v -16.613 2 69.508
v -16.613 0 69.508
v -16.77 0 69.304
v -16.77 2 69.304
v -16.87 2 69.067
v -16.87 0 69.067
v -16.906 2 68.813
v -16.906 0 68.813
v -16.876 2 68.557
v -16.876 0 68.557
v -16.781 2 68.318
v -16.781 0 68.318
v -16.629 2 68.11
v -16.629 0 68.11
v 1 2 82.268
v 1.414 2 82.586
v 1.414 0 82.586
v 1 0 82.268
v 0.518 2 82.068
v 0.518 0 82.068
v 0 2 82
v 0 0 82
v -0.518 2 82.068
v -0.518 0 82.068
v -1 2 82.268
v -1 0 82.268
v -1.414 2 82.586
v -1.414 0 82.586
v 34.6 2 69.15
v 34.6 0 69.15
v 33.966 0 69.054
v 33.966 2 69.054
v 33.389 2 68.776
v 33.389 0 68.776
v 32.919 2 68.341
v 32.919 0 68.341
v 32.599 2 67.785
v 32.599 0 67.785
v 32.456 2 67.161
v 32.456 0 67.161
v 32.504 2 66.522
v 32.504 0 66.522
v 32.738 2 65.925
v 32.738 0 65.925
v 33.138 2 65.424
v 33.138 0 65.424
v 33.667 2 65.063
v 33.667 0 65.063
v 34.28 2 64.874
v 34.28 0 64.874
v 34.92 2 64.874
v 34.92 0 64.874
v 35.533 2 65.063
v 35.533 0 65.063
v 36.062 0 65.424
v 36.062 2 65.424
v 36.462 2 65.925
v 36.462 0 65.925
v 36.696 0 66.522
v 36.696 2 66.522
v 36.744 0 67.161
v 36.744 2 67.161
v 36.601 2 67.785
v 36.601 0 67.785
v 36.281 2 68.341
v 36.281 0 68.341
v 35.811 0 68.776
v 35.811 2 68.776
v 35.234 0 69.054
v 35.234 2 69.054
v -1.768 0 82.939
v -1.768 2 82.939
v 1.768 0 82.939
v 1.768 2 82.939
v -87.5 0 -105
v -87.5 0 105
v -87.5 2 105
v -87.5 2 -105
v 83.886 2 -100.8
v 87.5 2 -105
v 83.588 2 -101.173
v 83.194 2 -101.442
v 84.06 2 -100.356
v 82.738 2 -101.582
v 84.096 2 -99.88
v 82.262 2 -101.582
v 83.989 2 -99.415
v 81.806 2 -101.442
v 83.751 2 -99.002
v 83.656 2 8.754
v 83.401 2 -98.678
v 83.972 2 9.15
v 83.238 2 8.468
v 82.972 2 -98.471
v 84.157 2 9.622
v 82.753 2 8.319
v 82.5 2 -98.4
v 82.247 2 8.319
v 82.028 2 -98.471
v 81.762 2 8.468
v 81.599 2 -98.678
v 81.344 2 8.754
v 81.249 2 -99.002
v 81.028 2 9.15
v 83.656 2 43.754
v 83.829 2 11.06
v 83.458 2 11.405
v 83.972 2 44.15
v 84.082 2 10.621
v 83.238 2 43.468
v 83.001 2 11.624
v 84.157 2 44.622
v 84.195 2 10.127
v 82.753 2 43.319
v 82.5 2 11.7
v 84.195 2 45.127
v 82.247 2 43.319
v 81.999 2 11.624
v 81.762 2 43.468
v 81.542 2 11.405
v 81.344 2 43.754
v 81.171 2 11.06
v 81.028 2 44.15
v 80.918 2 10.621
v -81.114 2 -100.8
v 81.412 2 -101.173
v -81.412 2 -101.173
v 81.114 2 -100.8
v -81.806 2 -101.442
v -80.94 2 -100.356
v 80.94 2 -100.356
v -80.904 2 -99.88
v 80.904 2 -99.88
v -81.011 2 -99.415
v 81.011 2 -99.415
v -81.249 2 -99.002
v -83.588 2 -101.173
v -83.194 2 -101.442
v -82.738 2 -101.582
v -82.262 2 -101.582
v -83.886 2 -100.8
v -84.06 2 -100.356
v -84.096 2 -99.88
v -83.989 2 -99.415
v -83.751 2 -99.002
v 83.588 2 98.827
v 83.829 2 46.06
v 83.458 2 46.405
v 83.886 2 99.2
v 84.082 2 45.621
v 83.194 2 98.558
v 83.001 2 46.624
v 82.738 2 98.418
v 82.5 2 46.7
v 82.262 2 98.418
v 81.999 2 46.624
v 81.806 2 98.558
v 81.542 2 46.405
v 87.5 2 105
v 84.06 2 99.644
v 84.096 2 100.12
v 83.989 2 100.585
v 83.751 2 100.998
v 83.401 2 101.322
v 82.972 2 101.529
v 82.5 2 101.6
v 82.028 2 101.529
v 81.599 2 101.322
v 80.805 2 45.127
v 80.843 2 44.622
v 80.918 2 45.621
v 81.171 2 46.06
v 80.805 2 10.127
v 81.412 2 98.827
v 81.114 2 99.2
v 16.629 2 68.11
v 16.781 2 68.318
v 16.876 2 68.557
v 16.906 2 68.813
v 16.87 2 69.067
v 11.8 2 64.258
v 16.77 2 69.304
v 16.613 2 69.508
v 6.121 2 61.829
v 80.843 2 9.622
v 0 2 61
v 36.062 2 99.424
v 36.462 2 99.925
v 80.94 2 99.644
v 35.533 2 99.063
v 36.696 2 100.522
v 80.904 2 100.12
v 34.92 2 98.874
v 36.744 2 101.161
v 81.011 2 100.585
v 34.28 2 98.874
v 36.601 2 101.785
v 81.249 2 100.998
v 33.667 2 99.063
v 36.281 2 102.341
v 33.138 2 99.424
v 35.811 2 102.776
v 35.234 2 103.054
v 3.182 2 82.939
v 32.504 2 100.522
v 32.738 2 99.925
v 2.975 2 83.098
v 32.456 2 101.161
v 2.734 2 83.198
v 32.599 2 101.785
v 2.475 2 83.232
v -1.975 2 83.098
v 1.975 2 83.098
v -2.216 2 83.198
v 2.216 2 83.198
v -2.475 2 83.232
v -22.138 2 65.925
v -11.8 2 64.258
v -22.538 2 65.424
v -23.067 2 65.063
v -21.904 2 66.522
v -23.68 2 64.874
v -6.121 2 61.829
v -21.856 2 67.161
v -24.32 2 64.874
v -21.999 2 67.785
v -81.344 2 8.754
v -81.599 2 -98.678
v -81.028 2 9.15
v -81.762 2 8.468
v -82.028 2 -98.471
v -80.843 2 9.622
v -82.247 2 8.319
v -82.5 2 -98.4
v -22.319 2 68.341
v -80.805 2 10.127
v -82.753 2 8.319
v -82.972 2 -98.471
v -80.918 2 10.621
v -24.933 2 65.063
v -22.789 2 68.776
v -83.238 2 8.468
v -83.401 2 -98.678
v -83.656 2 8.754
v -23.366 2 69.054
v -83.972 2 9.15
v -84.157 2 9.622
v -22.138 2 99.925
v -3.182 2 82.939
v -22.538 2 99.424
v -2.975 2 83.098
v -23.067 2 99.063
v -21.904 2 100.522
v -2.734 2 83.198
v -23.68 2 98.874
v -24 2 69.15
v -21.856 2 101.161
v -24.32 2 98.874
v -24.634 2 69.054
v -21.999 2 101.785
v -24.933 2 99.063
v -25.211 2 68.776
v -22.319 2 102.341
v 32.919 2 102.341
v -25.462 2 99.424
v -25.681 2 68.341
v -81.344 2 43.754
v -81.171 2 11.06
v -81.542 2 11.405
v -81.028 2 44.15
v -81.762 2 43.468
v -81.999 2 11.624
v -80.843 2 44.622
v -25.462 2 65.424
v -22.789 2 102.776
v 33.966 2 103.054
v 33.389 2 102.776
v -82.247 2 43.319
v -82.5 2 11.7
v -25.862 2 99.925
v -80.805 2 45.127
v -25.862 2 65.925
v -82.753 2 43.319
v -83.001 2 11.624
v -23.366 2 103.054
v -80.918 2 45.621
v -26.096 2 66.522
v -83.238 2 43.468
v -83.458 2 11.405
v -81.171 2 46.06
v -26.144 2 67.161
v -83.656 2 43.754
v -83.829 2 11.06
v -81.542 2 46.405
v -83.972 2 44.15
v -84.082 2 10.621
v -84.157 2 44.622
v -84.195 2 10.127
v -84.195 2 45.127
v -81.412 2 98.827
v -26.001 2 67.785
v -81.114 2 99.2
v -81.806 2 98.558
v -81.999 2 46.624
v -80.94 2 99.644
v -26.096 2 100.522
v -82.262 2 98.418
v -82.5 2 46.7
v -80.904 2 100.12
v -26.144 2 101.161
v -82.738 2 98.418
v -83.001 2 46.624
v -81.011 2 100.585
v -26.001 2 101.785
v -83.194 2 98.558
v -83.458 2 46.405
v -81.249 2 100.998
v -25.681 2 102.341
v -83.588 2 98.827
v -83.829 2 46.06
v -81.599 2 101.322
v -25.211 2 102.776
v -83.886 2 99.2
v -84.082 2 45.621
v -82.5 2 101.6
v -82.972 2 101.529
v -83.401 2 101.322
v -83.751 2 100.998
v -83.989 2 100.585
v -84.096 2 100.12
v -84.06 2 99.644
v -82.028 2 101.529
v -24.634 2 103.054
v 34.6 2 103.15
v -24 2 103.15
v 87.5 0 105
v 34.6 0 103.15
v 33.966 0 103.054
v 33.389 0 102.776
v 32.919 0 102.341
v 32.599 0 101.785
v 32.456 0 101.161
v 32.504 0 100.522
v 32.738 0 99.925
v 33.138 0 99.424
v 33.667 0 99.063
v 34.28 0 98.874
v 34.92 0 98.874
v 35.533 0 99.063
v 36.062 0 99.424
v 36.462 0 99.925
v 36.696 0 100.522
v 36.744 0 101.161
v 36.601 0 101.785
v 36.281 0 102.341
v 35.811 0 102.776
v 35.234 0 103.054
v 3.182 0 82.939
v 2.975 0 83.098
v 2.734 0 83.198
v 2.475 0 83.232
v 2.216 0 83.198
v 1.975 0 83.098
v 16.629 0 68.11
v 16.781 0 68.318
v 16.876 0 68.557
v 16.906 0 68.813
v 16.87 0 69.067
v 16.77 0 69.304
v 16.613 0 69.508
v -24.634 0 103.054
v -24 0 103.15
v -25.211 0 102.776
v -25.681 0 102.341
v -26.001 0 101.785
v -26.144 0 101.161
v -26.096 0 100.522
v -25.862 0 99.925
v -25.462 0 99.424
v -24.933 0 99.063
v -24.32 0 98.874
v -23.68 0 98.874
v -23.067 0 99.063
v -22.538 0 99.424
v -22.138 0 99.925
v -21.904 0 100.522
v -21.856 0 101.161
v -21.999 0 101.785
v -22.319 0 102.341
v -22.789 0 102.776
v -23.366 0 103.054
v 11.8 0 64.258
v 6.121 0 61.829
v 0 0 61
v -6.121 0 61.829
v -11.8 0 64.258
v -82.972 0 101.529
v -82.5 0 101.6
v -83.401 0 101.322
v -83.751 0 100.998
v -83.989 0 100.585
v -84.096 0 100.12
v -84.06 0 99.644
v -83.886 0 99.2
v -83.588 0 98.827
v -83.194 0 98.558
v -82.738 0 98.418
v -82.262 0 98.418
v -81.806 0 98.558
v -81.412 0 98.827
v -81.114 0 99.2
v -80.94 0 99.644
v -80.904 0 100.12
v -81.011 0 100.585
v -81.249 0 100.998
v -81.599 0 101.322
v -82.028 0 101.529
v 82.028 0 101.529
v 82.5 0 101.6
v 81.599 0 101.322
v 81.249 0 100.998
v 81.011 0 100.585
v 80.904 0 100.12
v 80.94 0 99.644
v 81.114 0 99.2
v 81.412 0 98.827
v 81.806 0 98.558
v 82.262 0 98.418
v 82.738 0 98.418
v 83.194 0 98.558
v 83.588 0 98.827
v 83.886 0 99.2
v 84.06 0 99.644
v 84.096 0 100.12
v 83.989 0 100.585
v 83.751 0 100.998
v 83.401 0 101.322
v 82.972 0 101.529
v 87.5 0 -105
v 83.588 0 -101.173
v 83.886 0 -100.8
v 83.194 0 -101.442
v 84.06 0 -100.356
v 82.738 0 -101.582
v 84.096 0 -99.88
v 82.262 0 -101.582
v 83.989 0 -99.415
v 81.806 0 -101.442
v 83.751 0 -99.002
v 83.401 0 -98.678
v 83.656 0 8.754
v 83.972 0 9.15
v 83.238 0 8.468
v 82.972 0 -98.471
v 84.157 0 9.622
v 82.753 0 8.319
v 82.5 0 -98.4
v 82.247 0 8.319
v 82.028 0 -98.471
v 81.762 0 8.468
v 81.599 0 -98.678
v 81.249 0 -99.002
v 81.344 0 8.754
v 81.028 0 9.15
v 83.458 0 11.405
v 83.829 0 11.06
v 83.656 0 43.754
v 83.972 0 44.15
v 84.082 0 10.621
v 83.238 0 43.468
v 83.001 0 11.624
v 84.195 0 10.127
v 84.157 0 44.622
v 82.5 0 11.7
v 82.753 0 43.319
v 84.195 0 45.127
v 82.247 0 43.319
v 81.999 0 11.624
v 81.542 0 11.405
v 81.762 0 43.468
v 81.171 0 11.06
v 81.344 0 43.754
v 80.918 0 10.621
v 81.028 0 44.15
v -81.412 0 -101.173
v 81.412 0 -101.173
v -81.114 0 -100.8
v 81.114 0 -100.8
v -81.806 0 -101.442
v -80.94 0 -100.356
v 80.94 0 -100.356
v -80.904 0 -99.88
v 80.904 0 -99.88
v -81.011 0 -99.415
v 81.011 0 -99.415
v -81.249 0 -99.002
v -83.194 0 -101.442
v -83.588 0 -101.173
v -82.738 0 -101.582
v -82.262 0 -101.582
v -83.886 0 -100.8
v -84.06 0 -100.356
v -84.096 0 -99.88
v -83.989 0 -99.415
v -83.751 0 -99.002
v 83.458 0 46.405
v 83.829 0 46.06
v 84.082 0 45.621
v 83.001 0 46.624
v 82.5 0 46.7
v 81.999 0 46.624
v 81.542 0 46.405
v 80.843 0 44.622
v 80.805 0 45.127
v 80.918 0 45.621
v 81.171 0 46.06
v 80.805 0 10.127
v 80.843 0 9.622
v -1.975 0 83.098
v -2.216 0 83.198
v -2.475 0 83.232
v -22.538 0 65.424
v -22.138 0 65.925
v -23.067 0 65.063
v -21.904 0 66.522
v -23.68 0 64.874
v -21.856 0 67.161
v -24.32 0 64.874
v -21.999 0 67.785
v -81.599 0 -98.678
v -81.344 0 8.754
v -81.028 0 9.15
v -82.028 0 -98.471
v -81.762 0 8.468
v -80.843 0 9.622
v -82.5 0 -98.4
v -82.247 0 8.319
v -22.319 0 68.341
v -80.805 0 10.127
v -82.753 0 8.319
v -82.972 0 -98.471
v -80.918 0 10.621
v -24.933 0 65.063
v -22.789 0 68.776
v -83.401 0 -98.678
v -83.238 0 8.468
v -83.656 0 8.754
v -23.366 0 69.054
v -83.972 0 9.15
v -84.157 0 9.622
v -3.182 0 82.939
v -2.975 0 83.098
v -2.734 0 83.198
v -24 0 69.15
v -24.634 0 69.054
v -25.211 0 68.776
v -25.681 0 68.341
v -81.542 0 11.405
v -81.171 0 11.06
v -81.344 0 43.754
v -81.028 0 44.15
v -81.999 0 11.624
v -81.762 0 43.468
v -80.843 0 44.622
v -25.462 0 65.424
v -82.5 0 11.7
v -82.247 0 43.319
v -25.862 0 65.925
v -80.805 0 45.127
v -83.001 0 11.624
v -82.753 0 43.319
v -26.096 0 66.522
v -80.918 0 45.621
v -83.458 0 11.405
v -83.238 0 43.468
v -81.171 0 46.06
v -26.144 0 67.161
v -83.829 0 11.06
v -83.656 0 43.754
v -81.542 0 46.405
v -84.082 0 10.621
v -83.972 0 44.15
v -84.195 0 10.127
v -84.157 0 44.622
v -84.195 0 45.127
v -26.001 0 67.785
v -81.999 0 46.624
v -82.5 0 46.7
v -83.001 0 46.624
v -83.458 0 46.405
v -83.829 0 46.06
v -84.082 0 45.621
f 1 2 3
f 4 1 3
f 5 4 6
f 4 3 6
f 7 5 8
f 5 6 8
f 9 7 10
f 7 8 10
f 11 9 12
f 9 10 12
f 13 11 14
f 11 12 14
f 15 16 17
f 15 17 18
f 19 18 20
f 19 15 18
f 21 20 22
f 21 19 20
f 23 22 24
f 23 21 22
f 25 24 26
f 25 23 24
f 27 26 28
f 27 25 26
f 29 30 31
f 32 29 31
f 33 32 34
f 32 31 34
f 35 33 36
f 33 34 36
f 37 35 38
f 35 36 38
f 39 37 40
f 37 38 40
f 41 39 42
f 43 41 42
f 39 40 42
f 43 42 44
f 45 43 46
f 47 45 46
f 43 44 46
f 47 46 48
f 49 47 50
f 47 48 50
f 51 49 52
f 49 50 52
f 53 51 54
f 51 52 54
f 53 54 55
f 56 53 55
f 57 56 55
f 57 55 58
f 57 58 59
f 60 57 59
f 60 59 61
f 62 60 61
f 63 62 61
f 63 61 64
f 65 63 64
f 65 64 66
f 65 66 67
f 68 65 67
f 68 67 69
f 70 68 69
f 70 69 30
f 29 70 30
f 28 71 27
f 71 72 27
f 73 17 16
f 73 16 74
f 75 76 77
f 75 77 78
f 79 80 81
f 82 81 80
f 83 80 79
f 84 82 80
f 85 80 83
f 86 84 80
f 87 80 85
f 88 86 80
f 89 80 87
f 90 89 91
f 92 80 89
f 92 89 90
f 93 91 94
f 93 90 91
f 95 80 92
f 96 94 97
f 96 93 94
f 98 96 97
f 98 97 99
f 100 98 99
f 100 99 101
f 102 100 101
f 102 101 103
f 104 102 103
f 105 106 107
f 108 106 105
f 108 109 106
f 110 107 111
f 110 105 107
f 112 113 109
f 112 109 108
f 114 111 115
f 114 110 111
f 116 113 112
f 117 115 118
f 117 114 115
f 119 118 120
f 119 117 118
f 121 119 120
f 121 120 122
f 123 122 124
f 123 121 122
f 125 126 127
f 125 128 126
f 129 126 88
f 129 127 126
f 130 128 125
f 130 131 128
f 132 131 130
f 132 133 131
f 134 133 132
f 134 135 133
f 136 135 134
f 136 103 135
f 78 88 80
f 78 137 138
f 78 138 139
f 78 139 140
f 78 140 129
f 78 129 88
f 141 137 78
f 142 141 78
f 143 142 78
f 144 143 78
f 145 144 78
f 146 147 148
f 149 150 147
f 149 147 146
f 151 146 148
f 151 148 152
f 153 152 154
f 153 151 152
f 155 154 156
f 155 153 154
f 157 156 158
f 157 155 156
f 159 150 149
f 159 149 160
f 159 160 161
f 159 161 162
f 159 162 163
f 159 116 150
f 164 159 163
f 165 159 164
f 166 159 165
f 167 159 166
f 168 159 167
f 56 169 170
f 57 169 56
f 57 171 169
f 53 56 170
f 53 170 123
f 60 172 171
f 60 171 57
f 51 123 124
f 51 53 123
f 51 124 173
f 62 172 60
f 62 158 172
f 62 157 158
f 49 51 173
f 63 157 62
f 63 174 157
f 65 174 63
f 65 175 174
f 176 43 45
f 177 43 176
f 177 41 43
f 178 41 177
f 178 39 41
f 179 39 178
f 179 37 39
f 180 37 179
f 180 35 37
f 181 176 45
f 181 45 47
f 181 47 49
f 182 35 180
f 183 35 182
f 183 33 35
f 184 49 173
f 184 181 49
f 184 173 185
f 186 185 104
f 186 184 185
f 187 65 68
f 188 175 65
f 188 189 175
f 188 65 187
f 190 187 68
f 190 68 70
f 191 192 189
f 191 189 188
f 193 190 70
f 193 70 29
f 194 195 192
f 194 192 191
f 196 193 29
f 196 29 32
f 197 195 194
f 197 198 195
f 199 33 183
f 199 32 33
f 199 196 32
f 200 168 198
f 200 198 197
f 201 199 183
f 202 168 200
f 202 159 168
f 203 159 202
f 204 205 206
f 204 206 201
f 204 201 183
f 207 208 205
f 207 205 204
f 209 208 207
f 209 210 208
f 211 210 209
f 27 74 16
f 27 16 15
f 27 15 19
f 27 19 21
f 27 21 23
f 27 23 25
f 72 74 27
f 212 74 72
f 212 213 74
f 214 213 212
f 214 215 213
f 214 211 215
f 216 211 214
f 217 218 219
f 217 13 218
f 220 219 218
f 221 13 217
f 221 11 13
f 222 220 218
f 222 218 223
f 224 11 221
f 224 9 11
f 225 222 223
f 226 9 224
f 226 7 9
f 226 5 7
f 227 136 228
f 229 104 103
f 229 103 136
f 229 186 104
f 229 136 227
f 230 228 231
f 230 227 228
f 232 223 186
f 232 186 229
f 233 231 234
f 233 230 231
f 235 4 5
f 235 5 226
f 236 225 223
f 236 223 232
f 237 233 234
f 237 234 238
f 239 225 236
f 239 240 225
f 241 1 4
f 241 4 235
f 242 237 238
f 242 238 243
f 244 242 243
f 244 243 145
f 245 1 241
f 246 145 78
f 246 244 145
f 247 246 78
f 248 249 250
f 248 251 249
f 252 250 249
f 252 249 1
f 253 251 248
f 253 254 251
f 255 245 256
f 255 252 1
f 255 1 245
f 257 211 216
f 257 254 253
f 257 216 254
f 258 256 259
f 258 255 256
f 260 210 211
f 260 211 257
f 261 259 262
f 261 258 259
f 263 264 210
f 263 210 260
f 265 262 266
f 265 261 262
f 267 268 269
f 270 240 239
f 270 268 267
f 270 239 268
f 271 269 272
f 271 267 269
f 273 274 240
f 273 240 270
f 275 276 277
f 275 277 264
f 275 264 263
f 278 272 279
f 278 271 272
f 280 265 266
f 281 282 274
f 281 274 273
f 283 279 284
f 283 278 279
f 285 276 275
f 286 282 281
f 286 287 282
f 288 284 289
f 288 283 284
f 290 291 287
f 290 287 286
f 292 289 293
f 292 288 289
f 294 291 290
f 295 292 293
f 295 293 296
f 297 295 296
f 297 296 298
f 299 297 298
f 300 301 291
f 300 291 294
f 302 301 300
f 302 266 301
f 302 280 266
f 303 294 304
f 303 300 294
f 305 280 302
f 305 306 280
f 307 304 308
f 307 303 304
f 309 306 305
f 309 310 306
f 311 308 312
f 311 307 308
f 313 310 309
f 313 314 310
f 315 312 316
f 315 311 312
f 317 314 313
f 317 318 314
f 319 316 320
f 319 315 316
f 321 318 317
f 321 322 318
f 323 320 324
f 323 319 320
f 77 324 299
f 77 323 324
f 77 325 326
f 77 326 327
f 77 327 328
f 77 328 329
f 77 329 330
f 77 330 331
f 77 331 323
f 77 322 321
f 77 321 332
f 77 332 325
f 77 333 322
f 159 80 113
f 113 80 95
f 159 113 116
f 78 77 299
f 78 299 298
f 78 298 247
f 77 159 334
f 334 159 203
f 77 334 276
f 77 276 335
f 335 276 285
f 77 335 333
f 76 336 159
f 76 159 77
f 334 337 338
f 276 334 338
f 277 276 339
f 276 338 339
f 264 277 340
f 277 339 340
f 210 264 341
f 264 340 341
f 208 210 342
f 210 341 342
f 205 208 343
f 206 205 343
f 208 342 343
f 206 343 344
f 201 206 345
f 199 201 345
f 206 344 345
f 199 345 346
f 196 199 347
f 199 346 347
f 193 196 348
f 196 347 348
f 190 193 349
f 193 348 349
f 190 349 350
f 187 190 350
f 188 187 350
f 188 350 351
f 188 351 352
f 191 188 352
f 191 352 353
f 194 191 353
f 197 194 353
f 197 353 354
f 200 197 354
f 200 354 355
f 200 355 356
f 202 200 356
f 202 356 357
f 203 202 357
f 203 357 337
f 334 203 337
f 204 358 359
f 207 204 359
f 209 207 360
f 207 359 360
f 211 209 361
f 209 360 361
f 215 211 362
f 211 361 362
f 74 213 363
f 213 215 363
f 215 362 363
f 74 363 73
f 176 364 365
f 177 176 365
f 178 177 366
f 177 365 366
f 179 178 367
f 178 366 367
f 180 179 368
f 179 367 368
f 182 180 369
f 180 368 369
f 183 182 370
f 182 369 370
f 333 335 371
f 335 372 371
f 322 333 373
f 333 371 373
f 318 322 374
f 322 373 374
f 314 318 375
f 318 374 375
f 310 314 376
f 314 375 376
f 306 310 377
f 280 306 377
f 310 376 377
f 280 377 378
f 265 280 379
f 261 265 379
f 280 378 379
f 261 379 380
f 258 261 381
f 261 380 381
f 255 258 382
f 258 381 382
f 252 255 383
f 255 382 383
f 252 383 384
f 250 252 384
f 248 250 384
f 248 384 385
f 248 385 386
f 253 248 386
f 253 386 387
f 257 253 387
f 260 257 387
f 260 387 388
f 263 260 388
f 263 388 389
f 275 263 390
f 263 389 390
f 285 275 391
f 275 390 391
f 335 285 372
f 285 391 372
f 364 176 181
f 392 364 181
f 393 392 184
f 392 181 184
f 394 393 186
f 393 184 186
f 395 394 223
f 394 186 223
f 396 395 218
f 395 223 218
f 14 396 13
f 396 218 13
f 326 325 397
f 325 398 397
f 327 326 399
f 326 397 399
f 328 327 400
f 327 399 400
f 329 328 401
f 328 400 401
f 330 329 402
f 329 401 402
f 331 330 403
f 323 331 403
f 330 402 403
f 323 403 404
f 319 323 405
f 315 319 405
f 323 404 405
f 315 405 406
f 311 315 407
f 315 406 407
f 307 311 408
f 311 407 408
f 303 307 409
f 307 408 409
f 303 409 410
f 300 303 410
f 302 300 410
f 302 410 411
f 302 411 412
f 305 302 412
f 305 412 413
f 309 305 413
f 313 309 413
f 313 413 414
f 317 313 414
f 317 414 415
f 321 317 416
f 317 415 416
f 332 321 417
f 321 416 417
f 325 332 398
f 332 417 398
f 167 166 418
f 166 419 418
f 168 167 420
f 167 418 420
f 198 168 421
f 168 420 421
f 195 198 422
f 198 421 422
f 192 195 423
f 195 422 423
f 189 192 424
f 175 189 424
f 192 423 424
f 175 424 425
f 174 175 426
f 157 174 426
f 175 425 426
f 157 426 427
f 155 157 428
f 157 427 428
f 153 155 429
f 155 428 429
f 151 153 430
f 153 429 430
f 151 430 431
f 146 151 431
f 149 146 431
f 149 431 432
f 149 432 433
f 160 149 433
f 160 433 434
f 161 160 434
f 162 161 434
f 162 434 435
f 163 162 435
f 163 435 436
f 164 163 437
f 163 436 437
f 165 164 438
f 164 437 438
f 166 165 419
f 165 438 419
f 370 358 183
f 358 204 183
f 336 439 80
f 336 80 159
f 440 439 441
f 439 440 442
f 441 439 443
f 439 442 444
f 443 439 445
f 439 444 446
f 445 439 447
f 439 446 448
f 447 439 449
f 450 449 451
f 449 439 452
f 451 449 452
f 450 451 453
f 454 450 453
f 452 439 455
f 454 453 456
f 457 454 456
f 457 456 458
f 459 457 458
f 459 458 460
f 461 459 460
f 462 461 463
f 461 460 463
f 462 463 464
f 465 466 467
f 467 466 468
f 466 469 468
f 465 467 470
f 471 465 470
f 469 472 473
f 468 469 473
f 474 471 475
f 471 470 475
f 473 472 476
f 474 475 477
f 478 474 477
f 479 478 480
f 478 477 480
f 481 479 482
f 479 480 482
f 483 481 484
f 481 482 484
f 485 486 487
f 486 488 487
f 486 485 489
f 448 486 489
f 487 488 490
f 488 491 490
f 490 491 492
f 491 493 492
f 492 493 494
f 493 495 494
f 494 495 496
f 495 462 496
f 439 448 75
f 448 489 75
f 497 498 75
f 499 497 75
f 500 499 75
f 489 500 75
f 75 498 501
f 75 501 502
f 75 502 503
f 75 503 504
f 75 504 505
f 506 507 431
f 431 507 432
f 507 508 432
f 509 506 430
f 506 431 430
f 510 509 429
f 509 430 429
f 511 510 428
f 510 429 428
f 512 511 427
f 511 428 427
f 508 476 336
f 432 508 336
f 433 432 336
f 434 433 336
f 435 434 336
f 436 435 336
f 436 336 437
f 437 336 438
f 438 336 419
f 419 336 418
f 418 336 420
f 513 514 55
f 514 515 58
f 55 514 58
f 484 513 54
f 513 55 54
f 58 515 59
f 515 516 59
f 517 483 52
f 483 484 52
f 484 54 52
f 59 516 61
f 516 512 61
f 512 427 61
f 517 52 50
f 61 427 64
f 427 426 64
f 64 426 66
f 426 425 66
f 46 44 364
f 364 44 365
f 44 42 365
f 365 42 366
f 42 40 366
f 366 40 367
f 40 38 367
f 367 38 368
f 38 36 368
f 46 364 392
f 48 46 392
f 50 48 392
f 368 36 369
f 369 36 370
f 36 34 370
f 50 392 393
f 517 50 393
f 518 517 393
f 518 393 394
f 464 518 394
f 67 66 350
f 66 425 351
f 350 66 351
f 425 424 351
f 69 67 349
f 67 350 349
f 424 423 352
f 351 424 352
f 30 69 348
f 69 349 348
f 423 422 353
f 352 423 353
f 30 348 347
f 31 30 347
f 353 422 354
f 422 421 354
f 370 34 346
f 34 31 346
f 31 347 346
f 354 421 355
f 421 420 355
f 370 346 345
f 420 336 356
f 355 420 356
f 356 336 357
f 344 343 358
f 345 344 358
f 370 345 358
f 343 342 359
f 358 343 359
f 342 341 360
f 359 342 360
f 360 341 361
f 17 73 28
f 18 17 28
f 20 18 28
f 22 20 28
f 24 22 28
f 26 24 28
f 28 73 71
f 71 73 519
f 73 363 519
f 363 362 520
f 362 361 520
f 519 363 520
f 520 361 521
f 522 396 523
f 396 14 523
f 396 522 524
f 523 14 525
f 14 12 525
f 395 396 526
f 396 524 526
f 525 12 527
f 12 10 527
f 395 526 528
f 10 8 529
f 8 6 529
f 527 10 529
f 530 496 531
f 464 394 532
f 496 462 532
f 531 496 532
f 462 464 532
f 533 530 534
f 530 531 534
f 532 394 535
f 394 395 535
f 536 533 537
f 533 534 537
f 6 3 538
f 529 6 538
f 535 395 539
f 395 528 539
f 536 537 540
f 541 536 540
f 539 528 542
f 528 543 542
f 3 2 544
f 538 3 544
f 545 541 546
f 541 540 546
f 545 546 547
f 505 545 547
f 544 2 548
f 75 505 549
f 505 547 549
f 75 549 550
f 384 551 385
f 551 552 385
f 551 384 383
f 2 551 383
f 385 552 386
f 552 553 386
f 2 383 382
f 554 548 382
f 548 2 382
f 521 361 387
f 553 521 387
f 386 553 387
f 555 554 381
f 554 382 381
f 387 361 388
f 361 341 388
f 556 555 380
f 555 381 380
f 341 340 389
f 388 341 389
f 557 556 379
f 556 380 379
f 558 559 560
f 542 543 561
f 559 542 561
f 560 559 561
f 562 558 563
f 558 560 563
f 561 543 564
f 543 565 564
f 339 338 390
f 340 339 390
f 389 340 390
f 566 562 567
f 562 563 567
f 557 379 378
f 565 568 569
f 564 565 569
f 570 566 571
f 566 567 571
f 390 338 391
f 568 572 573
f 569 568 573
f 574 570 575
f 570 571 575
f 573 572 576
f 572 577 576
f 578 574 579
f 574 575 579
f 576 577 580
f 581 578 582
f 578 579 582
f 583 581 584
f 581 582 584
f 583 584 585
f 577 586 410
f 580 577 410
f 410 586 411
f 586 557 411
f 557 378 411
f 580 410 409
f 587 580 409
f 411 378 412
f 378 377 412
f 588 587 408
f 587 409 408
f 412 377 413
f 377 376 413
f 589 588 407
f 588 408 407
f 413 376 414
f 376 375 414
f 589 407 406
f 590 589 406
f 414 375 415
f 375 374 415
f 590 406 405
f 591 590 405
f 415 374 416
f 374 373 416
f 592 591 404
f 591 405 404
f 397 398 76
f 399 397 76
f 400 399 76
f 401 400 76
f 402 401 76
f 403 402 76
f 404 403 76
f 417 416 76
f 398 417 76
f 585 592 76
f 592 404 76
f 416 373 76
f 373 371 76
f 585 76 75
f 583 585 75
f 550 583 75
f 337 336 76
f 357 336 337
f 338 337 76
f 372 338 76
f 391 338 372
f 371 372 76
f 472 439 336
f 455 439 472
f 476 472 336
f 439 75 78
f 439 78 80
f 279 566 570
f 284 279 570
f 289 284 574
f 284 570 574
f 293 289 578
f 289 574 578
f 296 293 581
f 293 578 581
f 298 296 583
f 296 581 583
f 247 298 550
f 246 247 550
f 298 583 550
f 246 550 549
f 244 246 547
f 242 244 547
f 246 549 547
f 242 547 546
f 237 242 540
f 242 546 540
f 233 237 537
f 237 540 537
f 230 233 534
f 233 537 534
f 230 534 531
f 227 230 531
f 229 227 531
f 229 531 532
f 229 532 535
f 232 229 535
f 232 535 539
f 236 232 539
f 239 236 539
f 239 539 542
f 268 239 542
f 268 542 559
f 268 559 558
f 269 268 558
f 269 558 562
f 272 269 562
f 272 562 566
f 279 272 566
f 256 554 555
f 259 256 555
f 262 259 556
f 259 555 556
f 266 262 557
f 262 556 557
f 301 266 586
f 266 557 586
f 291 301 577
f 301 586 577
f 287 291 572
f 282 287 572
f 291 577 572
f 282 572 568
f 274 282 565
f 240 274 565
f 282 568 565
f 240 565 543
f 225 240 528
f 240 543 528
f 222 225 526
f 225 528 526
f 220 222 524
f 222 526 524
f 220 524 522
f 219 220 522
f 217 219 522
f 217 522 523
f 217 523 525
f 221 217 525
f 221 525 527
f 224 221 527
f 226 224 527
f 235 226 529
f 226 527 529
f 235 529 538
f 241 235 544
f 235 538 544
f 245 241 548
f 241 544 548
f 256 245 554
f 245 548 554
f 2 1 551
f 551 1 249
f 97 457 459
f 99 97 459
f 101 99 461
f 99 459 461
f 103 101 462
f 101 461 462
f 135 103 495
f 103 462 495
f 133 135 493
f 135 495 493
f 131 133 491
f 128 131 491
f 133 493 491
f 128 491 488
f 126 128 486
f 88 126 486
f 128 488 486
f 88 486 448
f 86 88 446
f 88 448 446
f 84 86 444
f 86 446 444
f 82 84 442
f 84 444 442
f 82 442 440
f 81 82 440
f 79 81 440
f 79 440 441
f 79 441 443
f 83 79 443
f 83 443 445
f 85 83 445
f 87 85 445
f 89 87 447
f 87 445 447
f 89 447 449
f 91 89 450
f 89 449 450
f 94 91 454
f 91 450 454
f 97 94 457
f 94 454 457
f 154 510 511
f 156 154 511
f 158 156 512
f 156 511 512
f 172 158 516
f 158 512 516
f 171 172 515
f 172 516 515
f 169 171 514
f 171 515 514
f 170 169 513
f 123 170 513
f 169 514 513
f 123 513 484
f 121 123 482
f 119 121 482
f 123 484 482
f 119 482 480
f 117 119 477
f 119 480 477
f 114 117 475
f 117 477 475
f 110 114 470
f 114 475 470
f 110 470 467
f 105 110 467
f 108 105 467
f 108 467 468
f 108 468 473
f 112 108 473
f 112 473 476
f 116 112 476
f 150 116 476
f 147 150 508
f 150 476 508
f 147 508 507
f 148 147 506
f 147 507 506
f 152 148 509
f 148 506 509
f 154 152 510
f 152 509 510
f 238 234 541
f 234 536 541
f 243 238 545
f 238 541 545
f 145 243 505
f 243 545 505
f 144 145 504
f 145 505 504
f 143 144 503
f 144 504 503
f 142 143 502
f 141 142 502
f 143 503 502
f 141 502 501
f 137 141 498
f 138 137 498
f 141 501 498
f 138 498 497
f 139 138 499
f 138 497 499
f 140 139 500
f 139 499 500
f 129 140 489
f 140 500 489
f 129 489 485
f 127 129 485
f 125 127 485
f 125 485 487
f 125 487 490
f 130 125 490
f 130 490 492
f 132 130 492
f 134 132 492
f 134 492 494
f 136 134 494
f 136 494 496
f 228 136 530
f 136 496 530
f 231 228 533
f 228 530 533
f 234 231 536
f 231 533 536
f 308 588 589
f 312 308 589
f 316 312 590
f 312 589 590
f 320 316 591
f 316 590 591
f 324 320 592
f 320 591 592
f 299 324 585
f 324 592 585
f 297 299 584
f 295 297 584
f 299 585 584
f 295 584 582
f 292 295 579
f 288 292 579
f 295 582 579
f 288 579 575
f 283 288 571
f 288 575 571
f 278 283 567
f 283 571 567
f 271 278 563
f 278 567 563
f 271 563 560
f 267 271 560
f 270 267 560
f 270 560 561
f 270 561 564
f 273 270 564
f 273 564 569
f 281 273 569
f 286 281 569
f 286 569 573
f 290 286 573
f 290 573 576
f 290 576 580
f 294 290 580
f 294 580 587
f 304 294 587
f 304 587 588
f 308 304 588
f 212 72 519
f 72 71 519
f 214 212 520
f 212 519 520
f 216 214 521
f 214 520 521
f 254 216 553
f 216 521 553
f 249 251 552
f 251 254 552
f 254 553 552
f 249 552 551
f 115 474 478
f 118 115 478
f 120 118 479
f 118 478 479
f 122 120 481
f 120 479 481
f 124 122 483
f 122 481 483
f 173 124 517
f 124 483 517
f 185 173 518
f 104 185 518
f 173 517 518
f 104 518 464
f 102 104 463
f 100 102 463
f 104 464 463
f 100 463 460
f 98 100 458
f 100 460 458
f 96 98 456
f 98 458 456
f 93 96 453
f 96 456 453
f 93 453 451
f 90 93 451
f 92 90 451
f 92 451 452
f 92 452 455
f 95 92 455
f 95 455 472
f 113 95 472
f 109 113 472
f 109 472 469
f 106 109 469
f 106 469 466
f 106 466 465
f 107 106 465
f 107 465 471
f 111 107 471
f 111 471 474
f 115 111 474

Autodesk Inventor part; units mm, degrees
ref_plane "YZ Plane" through (0, 0, 0) normal (1, 0, 0) x (0, 1, 0)
ref_plane "XZ Plane" through (0, 0, 0) normal (0, 1, 0) x (-1, 0, 0)
ref_plane "XY Plane" through (0, 0, 0) normal (0, 0, 1) x (1, 0, 0)
sketch "スケッチ1" plane through (0, 0, 0) normal (0, 1, 0) x (-1, 0, 0)
  line L0 (-87.5, 105) -> (87.5, 105)
  line L1 (87.5, 105) -> (87.5, -105)
  line L2 (87.5, -105) -> (-87.5, -105)
  line L3 (-87.5, -105) -> (-87.5, 105)
  line L4 (-87.5, 105) -> (87.5, -105) construction
  line L5 (87.5, 105) -> (-87.5, -105) construction
  point P0 (0, 0)
  dimension "d0" = 210
  dimension "d1" = 175
extrude "プレート1" add sketch "スケッチ1" along normal blind 2
sketch "スケッチ5" plane through (0, 2, 0) normal (0, 1, 0) x (1, 0, 0)
  line L0 (-24, -101) -> (34.6, -101)
  line L1 (34.6, -101) -> (34.6, -67)
  line L2 (34.6, -67) -> (-24, -67)
  line L3 (-24, -67) -> (-24, -101)
  line L4 (-24, -101) -> (34.6, -67) construction
  line L5 (34.6, -101) -> (-24, -67) construction
  line L6 (87.5, -105) -> (-87.5, -105) projected
  point P0 (0, 0)
  point P1 (0, -84)
  point P2 (5.3, -84)
  point P3 (5.3, -84)
  dimension "d31" = 58.6
  dimension "d32" = 24
  dimension "d33" = 34
  dimension "d78" = 4
hole "穴3" at (34.6, 2, 67) at (34.6, 2, 101) at (-24, 2, 67) at (-24, 2, 101) direction (0, -1, 0) diameter 4.3 end through all clearance for "Socket Head Cap Screw" size "M4" standard "Ansi Metric M Profile"
sketch "スケッチ6" plane through (0, 2, 0) normal (0, 1, 0) x (1, 0, 0)
  line L0 (-133.9967, -217.2896) -> (133.2896, 49.9967)
  line L1 (133.2896, 49.9967) -> (133.9967, 49.2896)
  line L2 (133.9967, 49.2896) -> (-133.2896, -217.9967)
  line L3 (-133.2896, -217.9967) -> (-133.9967, -217.2896)
  line L4 (-133.9967, -217.2896) -> (133.9967, 49.2896) construction
  line L5 (133.2896, 49.9967) -> (-133.2896, -217.9967) construction
  line L6 (133.9967, -217.2896) -> (-133.2896, 49.9967)
  line L7 (-133.2896, 49.9967) -> (-133.9967, 49.2896)
  line L8 (-133.9967, 49.2896) -> (133.2896, -217.9967)
  line L9 (133.2896, -217.9967) -> (133.9967, -217.2896)
  line L10 (133.9967, -217.2896) -> (-133.9967, 49.2896) construction
  line L11 (-133.2896, 49.9967) -> (133.2896, -217.9967) construction
  line L12 (-2.4749, -82.2322) -> (-1.7678, -81.5251)
  circle A0 centre (0, -84) radius 22
  line L13 (2.4749, -82.2322) -> (1.7678, -81.5251)
  circle A1 centre (0, -84) radius 3
  line L14 (-87.5, -105) -> (-87.5, 105) projected
  line L15 (87.5, 105) -> (87.5, -105) projected
  line L16 (122.5, 0) -> (-122.5, 0) projected
  point P0 (0, 0)
  point P1 (0, -84)
  point P2 (-2.1213, -81.8787)
  point P3 (2.1213, -81.8787)
  point P4 (15.9059, -68.8012)
  point P5 (-15.9059, -68.8012)
  dimension "d54" = 1
  dimension "d55" = 1
  dimension "d57" = 44
  dimension "d59" = 3
  dimension "d60" = 3
  dimension "d65" = 186
  dimension "d66" = 186
  dimension "d79" = 45
  dimension "d80" = 45
extrude "押し出し2" cut sketch "スケッチ6" against normal blind 10 contours A0 L6 L12 L8 | A0 L0 A1 L6 | L12 L6 A1 | A0 L2 L13 L0 | L0 L13 A1
sketch "スケッチ7" plane through (0, 2, 0) normal (0, 1, 0) x (1, 0, 0)
  line L0 (-82.5, -100) -> (82.5, -100)
  line L1 (82.5, -100) -> (82.5, 100)
  line L2 (82.5, 100) -> (-82.5, 100)
  line L3 (-82.5, 100) -> (-82.5, -100)
  line L4 (-82.5, -100) -> (82.5, 100) construction
  line L5 (82.5, -100) -> (-82.5, 100) construction
  line L6 (-87.5, -105) -> (-87.5, 105) projected
  line L7 (87.5, -105) -> (-87.5, -105) projected
  point P0 (0, 0)
  point P1 (-82.5, -45)
  point P2 (-82.5, -10)
  point P3 (82.5, -45)
  point P4 (82.5, -10)
  dimension "d45" = 5
  dimension "d46" = 5
  dimension "d67" = 55
  dimension "d68" = 35
  dimension "d69" = 55
  dimension "d70" = 35
hole "穴4" at (-82.5, 2, -100) at (82.5, 2, -100) at (-82.5, 2, 100) at (82.5, 2, 100) direction (0, -1, 0) diameter 3.2 end through all clearance for "Socket Head Cap Screw" size "M3" standard "Ansi Metric M Profile"
sketch "スケッチ8" plane through (0, 2, 0) normal (0, 1, 0) x (1, 0, 0)
  line L0 (15.9059, -68.8012) -> (2.4749, -82.2322) projected
  line L1 (-2.1213, -81.8787) -> (-2.4749, -82.2322) projected
  arc A0 (2.1213, -81.8787) -> (-2.1213, -81.8787) centre (0, -84) ccw projected
  line L2 (2.4749, -82.2322) -> (2.1213, -81.8787) projected
  line L3 (-2.4749, -82.2322) -> (-15.9059, -68.8012) projected
  arc A1 (15.9059, -68.8012) -> (-15.9059, -68.8012) centre (0, -84) ccw projected
  line L4 (2.4749, -83.6464) -> (17.2895, -68.8318)
  arc A2 (17.2895, -68.8318) -> (-17.2895, -68.8318) centre (0, -84) ccw
  line L5 (-17.2895, -68.8318) -> (-2.4749, -83.6464)
  line L6 (-2.4749, -83.6464) -> (-1.4142, -82.5858)
  arc A3 (1.4142, -82.5858) -> (-1.4142, -82.5858) centre (0, -84) ccw
  line L7 (1.4142, -82.5858) -> (2.4749, -83.6464)
  point P0 (0, 0)
  dimension "d61" = 1
extrude "押し出し3" cut sketch "スケッチ8" against normal blind 10 contours L0 L2 A0 L1 L3 A1 | L7 A3 L6 L5 A2 L4
fillet "コーナーR1" radius 1 4 edges at (-2.4749, 1, 83.6464) (2.4749, 1, 83.6464) (-17.2895, 1, 68.8318) (17.2895, 1, 68.8318)
hole "穴5" at (-82.5, 2, 45) at (-82.5, 2, 10) at (82.5, 2, 45) at (82.5, 2, 10) direction (0, -1, 0) diameter 3.4 end through all clearance for "Flat Head Machine Screw" size "M3" standard "Ansi Metric M Profile"
equation "\"d40\" = Thickness"
equation "\"d60\" = d59"
equation "\"d66\" = d65"
equation "\"d69\" = d67"
equation "\"d70\" = d68"
equation "\"d76\" = Thickness"
equation "\"d2\" = Thickness"
equation "\"BendRadius\" = Thickness"
equation "\"BendReliefWidth\" = Thickness"
equation "\"BendReliefDepth\" = 0.5 * Thickness"
equation "\"CornerReliefSize\" = 4 * Thickness"
equation "\"MinimumRemnant\" = 2 * Thickness"
equation "\"TransitionRadius\" = BendRadius"
equation "\"JacobiRadiusSize\" = BendRadius"
equation "\"GapSize\" = Thickness"
equation "\"Thickness\" = 2"
properties part number "s_carbon_plate1" material "CFRP"
